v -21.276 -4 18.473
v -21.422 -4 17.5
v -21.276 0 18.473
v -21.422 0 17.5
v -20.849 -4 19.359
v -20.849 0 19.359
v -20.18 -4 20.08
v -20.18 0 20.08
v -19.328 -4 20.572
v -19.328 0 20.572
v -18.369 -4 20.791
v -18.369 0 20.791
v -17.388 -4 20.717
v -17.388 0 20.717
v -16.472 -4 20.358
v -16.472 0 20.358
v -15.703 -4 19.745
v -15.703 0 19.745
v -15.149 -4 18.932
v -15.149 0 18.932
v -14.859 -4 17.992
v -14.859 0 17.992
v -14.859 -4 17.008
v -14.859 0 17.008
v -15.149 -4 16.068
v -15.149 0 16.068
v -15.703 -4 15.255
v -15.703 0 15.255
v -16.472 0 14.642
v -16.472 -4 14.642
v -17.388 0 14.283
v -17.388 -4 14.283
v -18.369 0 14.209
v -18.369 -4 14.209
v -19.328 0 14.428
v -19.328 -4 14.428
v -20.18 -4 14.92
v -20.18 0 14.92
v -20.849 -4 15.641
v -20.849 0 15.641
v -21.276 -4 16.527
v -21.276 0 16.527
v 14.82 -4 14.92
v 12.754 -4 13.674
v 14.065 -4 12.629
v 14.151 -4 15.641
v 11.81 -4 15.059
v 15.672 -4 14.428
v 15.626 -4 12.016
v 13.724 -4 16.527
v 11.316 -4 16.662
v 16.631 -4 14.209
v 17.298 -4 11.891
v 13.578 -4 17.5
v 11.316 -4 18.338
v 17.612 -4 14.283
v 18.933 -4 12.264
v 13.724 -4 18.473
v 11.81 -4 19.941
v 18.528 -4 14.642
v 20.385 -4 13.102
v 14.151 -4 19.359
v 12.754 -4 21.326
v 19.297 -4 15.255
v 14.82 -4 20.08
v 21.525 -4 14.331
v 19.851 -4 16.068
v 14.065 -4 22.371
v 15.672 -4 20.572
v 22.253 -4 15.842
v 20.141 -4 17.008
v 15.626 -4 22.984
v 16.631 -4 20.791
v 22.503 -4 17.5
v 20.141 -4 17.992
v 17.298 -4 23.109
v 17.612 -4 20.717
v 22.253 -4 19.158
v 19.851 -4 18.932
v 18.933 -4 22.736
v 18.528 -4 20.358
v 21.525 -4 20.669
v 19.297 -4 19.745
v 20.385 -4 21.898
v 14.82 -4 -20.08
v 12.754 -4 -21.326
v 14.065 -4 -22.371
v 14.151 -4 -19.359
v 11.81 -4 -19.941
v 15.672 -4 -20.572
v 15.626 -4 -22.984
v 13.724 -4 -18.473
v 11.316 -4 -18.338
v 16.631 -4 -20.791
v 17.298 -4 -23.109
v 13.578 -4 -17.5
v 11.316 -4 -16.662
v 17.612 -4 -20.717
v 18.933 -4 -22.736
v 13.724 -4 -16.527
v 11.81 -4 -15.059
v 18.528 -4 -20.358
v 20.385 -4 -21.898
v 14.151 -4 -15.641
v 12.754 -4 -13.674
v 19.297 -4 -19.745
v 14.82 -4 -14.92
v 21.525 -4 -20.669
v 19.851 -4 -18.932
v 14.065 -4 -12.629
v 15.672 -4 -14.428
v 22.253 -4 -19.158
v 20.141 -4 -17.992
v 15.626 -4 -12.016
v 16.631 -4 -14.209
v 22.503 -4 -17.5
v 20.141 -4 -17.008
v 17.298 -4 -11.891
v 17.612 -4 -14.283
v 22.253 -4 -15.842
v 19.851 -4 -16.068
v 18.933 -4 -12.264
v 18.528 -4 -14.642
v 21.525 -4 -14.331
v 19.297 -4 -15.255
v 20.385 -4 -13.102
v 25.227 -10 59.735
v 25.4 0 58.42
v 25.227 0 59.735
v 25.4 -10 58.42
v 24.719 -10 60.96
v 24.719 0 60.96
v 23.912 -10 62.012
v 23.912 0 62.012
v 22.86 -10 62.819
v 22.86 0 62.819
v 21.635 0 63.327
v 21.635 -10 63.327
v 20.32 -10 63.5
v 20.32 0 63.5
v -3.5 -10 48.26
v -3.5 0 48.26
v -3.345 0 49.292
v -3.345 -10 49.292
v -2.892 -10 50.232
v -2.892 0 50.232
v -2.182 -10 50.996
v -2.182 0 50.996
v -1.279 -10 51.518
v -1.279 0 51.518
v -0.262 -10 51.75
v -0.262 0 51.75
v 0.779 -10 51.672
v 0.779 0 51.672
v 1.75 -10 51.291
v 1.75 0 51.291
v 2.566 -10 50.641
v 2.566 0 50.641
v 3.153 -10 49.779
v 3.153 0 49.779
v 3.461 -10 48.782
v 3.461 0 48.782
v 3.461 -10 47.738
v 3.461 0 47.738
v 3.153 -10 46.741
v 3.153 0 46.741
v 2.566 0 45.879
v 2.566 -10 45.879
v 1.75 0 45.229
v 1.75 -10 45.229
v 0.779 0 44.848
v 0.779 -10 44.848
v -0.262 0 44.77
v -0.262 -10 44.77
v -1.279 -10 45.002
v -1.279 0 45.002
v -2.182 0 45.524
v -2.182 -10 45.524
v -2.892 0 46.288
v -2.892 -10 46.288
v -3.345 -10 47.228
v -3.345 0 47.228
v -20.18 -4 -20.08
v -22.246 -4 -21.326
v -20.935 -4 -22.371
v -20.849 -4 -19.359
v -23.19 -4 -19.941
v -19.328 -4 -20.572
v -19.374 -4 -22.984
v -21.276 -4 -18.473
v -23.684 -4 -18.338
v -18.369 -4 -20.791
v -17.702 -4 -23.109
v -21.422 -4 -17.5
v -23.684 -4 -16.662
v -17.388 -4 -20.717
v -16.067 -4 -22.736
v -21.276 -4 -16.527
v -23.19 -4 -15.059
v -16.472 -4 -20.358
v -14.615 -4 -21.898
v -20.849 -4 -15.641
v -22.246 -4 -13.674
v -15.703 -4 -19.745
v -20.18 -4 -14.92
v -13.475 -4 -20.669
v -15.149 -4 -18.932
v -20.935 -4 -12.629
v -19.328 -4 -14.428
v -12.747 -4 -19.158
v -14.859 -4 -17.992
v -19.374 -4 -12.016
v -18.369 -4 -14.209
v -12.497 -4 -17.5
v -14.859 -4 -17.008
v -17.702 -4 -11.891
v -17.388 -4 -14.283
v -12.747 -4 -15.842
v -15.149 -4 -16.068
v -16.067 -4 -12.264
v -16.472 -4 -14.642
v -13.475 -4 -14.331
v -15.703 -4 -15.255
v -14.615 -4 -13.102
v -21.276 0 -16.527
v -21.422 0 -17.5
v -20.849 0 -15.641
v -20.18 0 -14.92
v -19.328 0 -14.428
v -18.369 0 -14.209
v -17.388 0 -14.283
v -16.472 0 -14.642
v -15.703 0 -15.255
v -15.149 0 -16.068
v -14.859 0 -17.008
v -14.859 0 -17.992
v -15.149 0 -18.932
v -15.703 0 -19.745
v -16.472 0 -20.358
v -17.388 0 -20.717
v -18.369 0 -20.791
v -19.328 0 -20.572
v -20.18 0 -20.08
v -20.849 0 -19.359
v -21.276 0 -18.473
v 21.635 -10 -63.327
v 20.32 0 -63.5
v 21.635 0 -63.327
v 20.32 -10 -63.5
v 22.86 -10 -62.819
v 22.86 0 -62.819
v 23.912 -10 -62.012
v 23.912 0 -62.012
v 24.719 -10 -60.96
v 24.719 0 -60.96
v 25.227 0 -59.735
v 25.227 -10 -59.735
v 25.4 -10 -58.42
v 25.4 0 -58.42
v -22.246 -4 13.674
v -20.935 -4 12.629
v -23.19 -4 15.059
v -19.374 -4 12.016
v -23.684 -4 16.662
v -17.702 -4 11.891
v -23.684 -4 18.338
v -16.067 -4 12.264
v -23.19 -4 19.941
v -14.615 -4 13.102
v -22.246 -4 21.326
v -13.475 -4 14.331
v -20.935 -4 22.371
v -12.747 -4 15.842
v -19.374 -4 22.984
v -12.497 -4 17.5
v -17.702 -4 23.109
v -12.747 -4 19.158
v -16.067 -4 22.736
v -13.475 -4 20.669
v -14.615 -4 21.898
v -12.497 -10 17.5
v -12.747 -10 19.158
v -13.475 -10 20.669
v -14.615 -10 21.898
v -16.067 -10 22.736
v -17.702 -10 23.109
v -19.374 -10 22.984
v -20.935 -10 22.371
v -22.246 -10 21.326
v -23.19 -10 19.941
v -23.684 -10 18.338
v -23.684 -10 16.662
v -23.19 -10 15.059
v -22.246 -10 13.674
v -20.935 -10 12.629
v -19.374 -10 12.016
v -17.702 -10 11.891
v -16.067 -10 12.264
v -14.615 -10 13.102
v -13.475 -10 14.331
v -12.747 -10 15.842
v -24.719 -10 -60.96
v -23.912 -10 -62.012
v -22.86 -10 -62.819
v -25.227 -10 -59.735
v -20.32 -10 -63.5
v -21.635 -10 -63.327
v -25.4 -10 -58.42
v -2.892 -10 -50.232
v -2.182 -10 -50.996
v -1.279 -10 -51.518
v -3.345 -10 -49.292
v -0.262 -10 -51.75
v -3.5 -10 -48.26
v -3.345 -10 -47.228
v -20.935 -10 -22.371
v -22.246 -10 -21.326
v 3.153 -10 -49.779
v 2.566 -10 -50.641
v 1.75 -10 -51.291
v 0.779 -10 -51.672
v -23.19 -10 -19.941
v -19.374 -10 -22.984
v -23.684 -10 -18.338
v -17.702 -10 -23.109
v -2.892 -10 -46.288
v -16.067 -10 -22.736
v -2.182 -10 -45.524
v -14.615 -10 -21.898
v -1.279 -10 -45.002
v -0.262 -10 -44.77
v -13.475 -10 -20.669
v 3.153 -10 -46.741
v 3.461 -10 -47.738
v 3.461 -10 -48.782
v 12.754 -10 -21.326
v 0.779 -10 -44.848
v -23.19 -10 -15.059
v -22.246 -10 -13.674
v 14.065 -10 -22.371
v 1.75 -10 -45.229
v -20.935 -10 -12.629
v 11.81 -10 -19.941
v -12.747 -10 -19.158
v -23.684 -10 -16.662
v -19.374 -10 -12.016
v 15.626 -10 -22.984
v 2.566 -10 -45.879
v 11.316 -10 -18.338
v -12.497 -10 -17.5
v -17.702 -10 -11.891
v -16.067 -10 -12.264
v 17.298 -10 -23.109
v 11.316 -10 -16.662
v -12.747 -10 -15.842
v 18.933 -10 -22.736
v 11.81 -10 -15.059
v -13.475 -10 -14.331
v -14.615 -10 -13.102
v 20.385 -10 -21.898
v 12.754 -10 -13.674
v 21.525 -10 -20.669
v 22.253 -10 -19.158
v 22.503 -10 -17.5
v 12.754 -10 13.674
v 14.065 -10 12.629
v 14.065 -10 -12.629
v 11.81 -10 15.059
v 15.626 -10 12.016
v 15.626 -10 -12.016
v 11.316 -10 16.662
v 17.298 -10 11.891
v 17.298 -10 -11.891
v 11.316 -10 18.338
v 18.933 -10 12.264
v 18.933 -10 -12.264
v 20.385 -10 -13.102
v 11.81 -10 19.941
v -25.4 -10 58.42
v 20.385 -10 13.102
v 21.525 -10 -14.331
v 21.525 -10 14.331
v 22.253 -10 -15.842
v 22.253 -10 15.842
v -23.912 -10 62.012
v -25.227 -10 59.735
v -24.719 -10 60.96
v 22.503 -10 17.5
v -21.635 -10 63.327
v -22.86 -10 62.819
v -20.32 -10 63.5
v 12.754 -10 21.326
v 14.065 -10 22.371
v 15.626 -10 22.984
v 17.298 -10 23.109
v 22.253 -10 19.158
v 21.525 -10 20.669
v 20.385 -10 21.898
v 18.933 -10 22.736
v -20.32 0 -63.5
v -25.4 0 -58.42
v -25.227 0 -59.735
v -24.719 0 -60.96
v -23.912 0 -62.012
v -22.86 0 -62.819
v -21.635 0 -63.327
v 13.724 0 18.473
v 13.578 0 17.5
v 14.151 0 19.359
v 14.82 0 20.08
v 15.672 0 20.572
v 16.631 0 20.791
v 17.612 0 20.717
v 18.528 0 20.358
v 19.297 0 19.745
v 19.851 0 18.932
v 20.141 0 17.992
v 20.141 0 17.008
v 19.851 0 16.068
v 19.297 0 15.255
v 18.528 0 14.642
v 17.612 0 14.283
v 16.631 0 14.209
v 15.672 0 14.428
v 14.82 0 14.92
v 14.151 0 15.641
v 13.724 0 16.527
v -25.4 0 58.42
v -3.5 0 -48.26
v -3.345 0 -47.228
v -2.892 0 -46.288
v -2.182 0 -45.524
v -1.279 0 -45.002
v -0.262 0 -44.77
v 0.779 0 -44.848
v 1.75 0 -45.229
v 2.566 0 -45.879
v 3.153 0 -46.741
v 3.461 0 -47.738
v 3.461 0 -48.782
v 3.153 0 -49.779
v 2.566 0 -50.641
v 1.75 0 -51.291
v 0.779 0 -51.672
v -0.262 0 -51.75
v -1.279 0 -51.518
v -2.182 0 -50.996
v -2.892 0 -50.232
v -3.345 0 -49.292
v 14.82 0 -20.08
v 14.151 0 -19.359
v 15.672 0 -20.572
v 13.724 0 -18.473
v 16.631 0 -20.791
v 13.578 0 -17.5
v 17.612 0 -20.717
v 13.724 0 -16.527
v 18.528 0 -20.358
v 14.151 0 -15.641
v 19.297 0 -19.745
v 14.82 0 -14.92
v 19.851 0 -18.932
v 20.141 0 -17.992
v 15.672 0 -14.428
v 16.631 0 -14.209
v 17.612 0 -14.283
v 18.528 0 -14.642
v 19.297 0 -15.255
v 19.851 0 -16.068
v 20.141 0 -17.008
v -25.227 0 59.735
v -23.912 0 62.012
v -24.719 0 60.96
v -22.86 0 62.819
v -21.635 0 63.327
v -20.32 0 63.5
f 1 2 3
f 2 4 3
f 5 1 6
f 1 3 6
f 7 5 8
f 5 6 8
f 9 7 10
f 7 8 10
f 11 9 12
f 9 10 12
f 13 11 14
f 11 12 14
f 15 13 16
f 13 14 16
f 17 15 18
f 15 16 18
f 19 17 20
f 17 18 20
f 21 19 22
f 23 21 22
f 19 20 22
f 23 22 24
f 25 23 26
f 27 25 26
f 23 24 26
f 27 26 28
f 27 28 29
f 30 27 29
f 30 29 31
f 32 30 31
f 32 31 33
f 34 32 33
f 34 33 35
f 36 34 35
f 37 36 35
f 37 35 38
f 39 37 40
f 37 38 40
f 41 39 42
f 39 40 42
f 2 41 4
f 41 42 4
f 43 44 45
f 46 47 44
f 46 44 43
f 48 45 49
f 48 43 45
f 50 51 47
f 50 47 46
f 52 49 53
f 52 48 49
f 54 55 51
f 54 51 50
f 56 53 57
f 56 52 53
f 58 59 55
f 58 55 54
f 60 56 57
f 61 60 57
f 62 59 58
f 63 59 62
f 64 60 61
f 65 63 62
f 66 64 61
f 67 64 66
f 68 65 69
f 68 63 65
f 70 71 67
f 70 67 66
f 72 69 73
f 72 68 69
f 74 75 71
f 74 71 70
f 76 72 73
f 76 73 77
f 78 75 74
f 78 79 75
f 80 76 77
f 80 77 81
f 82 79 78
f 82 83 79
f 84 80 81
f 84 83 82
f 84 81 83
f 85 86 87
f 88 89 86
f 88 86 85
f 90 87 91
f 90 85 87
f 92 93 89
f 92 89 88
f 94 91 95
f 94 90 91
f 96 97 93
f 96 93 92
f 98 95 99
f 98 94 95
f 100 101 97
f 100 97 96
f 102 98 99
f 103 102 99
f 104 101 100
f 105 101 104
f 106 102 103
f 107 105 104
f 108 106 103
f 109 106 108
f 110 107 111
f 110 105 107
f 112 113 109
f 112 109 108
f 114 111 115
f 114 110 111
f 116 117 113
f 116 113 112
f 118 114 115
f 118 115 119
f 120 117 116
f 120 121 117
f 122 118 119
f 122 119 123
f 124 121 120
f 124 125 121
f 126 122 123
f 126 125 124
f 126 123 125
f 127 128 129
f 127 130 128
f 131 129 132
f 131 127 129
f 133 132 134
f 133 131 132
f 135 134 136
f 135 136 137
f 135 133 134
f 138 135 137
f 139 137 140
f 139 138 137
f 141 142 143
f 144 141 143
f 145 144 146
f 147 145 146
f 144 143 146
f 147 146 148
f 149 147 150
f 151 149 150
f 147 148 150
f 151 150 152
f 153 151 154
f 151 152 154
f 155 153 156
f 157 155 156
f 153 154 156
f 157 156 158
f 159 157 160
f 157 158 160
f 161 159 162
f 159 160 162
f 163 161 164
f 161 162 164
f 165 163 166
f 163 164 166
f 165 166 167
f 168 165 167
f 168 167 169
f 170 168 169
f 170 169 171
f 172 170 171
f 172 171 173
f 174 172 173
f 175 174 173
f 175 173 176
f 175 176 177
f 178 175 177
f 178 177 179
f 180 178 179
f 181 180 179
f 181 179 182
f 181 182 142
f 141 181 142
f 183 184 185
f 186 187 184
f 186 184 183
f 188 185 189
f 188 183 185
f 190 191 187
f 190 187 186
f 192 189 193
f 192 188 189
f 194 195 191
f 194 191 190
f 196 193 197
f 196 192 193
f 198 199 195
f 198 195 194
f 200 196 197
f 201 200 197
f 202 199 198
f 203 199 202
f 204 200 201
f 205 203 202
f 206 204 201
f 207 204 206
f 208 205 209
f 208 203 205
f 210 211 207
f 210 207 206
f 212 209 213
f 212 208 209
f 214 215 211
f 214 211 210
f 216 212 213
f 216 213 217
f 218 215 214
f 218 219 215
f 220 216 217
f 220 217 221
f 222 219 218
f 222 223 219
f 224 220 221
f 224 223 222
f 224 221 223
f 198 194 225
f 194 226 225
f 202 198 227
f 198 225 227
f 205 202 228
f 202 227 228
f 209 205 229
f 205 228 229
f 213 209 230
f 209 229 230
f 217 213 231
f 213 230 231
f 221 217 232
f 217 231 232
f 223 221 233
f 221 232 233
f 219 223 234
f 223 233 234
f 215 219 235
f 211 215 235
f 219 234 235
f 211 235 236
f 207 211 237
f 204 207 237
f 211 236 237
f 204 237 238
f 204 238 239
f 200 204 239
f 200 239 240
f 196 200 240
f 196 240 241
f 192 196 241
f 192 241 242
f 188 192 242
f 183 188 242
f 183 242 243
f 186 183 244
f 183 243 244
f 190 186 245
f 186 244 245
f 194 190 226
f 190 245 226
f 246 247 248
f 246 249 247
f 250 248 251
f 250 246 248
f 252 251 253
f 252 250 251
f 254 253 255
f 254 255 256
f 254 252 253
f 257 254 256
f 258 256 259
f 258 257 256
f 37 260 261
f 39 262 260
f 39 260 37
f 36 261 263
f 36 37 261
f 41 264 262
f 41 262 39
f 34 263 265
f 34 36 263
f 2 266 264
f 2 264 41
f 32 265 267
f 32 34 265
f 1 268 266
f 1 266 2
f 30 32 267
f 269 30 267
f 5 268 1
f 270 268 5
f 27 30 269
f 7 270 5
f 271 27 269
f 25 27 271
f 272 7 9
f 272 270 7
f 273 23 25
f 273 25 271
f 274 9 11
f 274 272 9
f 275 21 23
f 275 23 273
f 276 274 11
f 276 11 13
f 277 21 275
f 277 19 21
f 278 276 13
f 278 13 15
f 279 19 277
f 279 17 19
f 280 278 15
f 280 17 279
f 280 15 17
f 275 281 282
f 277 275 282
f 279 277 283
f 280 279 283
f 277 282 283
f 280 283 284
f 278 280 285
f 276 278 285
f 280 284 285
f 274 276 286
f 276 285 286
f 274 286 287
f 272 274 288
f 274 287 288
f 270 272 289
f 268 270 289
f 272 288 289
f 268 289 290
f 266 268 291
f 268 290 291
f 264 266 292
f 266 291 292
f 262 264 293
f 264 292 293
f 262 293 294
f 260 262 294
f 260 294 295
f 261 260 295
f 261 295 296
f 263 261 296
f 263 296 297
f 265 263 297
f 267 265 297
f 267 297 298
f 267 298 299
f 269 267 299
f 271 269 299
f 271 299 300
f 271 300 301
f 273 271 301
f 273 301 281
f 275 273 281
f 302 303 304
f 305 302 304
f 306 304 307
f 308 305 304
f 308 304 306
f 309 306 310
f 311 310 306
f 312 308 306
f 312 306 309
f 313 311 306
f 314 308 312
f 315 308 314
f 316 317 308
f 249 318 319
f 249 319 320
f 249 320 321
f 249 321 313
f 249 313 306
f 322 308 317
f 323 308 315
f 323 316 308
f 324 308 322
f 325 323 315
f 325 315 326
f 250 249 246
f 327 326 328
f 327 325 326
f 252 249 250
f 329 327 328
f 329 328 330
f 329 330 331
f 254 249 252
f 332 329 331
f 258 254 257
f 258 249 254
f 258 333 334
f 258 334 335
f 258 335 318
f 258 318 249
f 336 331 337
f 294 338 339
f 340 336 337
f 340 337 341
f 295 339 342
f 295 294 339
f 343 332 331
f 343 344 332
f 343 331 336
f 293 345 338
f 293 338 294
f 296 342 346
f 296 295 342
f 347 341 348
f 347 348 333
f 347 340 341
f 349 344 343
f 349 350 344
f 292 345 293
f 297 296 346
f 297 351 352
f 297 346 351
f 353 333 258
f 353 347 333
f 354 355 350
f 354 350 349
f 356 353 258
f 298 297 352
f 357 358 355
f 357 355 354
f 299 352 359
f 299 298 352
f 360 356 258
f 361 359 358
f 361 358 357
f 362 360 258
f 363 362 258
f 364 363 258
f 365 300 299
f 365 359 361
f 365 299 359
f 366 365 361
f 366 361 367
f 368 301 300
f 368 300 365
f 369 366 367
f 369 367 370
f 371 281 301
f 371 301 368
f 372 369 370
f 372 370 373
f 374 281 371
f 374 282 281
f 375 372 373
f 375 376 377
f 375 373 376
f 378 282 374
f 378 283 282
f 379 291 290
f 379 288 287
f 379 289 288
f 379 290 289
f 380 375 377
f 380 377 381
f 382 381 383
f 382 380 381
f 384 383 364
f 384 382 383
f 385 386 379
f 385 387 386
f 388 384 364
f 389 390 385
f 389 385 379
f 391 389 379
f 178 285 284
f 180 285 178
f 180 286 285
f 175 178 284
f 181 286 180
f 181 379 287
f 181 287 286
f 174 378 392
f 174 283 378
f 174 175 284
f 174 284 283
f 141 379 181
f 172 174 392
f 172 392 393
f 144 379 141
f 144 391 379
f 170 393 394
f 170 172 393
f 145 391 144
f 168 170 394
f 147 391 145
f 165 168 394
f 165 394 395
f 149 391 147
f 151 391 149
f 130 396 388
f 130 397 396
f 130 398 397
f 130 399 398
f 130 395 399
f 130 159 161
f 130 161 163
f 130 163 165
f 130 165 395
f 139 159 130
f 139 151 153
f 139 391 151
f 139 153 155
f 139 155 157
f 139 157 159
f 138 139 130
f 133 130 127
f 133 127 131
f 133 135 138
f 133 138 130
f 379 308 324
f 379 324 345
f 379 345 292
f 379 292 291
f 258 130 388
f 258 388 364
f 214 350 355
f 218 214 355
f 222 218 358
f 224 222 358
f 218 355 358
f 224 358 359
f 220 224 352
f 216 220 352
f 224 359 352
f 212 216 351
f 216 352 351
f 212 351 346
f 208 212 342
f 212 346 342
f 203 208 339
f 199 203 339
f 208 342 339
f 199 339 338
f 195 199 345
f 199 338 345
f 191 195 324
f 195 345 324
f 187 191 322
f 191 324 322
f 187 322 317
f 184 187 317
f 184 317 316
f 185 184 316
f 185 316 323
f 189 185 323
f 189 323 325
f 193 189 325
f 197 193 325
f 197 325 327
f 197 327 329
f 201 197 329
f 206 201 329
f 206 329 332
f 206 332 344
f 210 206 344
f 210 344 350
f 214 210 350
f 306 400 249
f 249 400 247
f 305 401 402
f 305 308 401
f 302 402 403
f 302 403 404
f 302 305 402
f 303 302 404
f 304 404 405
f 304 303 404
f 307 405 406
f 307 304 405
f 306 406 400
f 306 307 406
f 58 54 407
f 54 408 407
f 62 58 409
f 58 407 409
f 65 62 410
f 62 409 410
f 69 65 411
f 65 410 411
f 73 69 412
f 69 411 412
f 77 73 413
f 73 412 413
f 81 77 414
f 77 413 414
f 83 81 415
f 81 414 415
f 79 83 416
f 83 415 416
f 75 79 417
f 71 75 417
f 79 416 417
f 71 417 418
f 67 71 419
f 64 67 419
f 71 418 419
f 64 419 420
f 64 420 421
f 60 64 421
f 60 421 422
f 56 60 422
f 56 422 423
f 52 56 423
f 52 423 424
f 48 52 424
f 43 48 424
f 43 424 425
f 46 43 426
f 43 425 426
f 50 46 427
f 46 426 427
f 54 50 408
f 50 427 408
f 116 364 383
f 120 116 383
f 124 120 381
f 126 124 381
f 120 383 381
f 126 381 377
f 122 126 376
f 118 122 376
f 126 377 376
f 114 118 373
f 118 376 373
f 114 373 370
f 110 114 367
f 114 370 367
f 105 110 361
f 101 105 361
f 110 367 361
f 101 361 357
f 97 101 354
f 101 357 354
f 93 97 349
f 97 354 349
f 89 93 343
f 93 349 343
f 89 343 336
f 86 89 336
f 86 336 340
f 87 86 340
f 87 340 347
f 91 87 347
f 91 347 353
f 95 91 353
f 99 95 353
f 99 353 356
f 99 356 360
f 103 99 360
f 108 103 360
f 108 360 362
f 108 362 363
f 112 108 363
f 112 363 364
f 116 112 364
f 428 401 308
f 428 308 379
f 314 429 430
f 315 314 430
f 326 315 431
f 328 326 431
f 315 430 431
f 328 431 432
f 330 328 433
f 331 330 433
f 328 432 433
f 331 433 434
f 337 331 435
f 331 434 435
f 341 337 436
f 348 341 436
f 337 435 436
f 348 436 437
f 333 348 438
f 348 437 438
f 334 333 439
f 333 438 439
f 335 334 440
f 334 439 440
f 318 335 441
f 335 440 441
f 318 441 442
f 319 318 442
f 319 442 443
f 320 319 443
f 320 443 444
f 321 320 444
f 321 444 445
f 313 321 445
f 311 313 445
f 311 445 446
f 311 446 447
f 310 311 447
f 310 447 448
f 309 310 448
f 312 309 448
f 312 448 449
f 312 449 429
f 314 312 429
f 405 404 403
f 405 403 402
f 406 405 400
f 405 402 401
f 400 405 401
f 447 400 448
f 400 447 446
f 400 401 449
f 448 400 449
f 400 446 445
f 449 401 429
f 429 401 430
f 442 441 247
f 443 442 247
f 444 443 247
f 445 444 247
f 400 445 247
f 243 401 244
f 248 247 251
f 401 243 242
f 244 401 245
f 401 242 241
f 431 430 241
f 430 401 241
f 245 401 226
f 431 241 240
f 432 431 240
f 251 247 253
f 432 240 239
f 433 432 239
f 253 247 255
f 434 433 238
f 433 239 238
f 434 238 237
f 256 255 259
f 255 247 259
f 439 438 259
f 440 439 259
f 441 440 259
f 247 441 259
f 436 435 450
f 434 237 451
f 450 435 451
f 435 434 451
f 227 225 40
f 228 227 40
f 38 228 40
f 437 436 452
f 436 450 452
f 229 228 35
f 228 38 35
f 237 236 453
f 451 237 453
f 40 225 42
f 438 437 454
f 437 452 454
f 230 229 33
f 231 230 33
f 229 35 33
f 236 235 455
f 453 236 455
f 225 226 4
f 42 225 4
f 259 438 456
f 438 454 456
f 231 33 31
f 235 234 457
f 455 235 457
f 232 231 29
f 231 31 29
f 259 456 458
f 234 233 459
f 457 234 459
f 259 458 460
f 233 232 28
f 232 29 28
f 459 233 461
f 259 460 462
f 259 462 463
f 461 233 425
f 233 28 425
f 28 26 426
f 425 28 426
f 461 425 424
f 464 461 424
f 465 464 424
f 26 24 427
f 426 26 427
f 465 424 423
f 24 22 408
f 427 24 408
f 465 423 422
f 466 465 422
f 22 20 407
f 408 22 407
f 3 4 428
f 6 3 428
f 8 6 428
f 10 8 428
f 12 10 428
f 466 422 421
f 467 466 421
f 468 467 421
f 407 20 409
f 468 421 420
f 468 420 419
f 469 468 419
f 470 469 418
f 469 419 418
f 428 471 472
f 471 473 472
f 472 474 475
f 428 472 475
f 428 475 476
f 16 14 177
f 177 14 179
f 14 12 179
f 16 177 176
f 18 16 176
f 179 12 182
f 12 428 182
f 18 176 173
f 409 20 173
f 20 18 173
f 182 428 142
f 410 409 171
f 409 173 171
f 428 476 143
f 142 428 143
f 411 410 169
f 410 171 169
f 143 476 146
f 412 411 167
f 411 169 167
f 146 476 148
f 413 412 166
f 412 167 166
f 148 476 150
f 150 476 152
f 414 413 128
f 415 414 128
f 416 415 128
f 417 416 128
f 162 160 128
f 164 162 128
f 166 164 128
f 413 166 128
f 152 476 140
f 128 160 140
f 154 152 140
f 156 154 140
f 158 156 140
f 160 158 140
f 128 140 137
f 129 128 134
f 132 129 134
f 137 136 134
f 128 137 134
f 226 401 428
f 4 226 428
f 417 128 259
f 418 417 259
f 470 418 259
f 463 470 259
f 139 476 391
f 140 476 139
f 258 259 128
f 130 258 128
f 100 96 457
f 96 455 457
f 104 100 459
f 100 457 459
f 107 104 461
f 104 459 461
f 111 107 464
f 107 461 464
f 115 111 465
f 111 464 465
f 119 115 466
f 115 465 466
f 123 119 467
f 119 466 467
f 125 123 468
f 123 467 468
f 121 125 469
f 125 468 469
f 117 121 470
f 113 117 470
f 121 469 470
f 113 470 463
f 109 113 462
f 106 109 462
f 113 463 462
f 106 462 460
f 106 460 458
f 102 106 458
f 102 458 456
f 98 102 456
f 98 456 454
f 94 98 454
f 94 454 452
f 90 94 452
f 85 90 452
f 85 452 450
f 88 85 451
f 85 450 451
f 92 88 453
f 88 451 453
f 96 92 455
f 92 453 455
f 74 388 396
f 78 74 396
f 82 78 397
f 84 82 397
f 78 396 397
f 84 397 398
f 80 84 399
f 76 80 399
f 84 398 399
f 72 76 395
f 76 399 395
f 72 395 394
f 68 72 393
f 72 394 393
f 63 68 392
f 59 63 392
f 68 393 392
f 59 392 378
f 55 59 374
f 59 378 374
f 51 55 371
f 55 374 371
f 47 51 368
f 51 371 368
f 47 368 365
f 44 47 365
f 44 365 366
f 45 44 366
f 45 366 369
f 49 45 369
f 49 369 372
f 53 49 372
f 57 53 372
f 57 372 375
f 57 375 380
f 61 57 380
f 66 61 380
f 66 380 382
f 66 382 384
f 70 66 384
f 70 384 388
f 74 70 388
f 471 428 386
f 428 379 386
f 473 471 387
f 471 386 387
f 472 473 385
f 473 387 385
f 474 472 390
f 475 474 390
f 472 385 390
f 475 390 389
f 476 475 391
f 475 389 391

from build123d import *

# Parameters (mm, degrees)
F0_W           = 50.8
F0_H           = 127
F1_DEPTH       = 10
F2_R           = 5.08
F4_D           = 7
F6_D           = 6.6
F6_CBORE_D     = 11.25
F6_CBORE_DEPTH = 6


with BuildPart() as f1:
    # F0 (on Front) → F1 (new body)
    with BuildSketch(Plane.XZ):
        Rectangle(F0_W, F0_H)
    extrude(amount=F1_DEPTH)

    # F2
    f2_edges = [f1.edges().sort_by_distance(p)[0] for p in [
        (25.4, -5, 63.5),
        (25.4, -5, -63.5),
        (-25.4, -5, -63.5),
        (-25.4, -5, 63.5),
    ]]
    fillet(f2_edges, radius=F2_R)

    # F4 (through all)
    with Locations(Plane.XZ.offset(10)):
        with Locations((0, 48.26), (0, -48.26)):
            Hole(F4_D / 2)

    # F6 (through all)
    with Locations(Plane.XZ.offset(10)):
        with Locations((-18.122286547, 17.5), (16.877713453, 17.5), (16.877713453, -17.5), (-18.122286547, -17.5)):
            CounterBoreHole(F6_D / 2, F6_CBORE_D / 2, F6_CBORE_DEPTH)


solid = f1.part
